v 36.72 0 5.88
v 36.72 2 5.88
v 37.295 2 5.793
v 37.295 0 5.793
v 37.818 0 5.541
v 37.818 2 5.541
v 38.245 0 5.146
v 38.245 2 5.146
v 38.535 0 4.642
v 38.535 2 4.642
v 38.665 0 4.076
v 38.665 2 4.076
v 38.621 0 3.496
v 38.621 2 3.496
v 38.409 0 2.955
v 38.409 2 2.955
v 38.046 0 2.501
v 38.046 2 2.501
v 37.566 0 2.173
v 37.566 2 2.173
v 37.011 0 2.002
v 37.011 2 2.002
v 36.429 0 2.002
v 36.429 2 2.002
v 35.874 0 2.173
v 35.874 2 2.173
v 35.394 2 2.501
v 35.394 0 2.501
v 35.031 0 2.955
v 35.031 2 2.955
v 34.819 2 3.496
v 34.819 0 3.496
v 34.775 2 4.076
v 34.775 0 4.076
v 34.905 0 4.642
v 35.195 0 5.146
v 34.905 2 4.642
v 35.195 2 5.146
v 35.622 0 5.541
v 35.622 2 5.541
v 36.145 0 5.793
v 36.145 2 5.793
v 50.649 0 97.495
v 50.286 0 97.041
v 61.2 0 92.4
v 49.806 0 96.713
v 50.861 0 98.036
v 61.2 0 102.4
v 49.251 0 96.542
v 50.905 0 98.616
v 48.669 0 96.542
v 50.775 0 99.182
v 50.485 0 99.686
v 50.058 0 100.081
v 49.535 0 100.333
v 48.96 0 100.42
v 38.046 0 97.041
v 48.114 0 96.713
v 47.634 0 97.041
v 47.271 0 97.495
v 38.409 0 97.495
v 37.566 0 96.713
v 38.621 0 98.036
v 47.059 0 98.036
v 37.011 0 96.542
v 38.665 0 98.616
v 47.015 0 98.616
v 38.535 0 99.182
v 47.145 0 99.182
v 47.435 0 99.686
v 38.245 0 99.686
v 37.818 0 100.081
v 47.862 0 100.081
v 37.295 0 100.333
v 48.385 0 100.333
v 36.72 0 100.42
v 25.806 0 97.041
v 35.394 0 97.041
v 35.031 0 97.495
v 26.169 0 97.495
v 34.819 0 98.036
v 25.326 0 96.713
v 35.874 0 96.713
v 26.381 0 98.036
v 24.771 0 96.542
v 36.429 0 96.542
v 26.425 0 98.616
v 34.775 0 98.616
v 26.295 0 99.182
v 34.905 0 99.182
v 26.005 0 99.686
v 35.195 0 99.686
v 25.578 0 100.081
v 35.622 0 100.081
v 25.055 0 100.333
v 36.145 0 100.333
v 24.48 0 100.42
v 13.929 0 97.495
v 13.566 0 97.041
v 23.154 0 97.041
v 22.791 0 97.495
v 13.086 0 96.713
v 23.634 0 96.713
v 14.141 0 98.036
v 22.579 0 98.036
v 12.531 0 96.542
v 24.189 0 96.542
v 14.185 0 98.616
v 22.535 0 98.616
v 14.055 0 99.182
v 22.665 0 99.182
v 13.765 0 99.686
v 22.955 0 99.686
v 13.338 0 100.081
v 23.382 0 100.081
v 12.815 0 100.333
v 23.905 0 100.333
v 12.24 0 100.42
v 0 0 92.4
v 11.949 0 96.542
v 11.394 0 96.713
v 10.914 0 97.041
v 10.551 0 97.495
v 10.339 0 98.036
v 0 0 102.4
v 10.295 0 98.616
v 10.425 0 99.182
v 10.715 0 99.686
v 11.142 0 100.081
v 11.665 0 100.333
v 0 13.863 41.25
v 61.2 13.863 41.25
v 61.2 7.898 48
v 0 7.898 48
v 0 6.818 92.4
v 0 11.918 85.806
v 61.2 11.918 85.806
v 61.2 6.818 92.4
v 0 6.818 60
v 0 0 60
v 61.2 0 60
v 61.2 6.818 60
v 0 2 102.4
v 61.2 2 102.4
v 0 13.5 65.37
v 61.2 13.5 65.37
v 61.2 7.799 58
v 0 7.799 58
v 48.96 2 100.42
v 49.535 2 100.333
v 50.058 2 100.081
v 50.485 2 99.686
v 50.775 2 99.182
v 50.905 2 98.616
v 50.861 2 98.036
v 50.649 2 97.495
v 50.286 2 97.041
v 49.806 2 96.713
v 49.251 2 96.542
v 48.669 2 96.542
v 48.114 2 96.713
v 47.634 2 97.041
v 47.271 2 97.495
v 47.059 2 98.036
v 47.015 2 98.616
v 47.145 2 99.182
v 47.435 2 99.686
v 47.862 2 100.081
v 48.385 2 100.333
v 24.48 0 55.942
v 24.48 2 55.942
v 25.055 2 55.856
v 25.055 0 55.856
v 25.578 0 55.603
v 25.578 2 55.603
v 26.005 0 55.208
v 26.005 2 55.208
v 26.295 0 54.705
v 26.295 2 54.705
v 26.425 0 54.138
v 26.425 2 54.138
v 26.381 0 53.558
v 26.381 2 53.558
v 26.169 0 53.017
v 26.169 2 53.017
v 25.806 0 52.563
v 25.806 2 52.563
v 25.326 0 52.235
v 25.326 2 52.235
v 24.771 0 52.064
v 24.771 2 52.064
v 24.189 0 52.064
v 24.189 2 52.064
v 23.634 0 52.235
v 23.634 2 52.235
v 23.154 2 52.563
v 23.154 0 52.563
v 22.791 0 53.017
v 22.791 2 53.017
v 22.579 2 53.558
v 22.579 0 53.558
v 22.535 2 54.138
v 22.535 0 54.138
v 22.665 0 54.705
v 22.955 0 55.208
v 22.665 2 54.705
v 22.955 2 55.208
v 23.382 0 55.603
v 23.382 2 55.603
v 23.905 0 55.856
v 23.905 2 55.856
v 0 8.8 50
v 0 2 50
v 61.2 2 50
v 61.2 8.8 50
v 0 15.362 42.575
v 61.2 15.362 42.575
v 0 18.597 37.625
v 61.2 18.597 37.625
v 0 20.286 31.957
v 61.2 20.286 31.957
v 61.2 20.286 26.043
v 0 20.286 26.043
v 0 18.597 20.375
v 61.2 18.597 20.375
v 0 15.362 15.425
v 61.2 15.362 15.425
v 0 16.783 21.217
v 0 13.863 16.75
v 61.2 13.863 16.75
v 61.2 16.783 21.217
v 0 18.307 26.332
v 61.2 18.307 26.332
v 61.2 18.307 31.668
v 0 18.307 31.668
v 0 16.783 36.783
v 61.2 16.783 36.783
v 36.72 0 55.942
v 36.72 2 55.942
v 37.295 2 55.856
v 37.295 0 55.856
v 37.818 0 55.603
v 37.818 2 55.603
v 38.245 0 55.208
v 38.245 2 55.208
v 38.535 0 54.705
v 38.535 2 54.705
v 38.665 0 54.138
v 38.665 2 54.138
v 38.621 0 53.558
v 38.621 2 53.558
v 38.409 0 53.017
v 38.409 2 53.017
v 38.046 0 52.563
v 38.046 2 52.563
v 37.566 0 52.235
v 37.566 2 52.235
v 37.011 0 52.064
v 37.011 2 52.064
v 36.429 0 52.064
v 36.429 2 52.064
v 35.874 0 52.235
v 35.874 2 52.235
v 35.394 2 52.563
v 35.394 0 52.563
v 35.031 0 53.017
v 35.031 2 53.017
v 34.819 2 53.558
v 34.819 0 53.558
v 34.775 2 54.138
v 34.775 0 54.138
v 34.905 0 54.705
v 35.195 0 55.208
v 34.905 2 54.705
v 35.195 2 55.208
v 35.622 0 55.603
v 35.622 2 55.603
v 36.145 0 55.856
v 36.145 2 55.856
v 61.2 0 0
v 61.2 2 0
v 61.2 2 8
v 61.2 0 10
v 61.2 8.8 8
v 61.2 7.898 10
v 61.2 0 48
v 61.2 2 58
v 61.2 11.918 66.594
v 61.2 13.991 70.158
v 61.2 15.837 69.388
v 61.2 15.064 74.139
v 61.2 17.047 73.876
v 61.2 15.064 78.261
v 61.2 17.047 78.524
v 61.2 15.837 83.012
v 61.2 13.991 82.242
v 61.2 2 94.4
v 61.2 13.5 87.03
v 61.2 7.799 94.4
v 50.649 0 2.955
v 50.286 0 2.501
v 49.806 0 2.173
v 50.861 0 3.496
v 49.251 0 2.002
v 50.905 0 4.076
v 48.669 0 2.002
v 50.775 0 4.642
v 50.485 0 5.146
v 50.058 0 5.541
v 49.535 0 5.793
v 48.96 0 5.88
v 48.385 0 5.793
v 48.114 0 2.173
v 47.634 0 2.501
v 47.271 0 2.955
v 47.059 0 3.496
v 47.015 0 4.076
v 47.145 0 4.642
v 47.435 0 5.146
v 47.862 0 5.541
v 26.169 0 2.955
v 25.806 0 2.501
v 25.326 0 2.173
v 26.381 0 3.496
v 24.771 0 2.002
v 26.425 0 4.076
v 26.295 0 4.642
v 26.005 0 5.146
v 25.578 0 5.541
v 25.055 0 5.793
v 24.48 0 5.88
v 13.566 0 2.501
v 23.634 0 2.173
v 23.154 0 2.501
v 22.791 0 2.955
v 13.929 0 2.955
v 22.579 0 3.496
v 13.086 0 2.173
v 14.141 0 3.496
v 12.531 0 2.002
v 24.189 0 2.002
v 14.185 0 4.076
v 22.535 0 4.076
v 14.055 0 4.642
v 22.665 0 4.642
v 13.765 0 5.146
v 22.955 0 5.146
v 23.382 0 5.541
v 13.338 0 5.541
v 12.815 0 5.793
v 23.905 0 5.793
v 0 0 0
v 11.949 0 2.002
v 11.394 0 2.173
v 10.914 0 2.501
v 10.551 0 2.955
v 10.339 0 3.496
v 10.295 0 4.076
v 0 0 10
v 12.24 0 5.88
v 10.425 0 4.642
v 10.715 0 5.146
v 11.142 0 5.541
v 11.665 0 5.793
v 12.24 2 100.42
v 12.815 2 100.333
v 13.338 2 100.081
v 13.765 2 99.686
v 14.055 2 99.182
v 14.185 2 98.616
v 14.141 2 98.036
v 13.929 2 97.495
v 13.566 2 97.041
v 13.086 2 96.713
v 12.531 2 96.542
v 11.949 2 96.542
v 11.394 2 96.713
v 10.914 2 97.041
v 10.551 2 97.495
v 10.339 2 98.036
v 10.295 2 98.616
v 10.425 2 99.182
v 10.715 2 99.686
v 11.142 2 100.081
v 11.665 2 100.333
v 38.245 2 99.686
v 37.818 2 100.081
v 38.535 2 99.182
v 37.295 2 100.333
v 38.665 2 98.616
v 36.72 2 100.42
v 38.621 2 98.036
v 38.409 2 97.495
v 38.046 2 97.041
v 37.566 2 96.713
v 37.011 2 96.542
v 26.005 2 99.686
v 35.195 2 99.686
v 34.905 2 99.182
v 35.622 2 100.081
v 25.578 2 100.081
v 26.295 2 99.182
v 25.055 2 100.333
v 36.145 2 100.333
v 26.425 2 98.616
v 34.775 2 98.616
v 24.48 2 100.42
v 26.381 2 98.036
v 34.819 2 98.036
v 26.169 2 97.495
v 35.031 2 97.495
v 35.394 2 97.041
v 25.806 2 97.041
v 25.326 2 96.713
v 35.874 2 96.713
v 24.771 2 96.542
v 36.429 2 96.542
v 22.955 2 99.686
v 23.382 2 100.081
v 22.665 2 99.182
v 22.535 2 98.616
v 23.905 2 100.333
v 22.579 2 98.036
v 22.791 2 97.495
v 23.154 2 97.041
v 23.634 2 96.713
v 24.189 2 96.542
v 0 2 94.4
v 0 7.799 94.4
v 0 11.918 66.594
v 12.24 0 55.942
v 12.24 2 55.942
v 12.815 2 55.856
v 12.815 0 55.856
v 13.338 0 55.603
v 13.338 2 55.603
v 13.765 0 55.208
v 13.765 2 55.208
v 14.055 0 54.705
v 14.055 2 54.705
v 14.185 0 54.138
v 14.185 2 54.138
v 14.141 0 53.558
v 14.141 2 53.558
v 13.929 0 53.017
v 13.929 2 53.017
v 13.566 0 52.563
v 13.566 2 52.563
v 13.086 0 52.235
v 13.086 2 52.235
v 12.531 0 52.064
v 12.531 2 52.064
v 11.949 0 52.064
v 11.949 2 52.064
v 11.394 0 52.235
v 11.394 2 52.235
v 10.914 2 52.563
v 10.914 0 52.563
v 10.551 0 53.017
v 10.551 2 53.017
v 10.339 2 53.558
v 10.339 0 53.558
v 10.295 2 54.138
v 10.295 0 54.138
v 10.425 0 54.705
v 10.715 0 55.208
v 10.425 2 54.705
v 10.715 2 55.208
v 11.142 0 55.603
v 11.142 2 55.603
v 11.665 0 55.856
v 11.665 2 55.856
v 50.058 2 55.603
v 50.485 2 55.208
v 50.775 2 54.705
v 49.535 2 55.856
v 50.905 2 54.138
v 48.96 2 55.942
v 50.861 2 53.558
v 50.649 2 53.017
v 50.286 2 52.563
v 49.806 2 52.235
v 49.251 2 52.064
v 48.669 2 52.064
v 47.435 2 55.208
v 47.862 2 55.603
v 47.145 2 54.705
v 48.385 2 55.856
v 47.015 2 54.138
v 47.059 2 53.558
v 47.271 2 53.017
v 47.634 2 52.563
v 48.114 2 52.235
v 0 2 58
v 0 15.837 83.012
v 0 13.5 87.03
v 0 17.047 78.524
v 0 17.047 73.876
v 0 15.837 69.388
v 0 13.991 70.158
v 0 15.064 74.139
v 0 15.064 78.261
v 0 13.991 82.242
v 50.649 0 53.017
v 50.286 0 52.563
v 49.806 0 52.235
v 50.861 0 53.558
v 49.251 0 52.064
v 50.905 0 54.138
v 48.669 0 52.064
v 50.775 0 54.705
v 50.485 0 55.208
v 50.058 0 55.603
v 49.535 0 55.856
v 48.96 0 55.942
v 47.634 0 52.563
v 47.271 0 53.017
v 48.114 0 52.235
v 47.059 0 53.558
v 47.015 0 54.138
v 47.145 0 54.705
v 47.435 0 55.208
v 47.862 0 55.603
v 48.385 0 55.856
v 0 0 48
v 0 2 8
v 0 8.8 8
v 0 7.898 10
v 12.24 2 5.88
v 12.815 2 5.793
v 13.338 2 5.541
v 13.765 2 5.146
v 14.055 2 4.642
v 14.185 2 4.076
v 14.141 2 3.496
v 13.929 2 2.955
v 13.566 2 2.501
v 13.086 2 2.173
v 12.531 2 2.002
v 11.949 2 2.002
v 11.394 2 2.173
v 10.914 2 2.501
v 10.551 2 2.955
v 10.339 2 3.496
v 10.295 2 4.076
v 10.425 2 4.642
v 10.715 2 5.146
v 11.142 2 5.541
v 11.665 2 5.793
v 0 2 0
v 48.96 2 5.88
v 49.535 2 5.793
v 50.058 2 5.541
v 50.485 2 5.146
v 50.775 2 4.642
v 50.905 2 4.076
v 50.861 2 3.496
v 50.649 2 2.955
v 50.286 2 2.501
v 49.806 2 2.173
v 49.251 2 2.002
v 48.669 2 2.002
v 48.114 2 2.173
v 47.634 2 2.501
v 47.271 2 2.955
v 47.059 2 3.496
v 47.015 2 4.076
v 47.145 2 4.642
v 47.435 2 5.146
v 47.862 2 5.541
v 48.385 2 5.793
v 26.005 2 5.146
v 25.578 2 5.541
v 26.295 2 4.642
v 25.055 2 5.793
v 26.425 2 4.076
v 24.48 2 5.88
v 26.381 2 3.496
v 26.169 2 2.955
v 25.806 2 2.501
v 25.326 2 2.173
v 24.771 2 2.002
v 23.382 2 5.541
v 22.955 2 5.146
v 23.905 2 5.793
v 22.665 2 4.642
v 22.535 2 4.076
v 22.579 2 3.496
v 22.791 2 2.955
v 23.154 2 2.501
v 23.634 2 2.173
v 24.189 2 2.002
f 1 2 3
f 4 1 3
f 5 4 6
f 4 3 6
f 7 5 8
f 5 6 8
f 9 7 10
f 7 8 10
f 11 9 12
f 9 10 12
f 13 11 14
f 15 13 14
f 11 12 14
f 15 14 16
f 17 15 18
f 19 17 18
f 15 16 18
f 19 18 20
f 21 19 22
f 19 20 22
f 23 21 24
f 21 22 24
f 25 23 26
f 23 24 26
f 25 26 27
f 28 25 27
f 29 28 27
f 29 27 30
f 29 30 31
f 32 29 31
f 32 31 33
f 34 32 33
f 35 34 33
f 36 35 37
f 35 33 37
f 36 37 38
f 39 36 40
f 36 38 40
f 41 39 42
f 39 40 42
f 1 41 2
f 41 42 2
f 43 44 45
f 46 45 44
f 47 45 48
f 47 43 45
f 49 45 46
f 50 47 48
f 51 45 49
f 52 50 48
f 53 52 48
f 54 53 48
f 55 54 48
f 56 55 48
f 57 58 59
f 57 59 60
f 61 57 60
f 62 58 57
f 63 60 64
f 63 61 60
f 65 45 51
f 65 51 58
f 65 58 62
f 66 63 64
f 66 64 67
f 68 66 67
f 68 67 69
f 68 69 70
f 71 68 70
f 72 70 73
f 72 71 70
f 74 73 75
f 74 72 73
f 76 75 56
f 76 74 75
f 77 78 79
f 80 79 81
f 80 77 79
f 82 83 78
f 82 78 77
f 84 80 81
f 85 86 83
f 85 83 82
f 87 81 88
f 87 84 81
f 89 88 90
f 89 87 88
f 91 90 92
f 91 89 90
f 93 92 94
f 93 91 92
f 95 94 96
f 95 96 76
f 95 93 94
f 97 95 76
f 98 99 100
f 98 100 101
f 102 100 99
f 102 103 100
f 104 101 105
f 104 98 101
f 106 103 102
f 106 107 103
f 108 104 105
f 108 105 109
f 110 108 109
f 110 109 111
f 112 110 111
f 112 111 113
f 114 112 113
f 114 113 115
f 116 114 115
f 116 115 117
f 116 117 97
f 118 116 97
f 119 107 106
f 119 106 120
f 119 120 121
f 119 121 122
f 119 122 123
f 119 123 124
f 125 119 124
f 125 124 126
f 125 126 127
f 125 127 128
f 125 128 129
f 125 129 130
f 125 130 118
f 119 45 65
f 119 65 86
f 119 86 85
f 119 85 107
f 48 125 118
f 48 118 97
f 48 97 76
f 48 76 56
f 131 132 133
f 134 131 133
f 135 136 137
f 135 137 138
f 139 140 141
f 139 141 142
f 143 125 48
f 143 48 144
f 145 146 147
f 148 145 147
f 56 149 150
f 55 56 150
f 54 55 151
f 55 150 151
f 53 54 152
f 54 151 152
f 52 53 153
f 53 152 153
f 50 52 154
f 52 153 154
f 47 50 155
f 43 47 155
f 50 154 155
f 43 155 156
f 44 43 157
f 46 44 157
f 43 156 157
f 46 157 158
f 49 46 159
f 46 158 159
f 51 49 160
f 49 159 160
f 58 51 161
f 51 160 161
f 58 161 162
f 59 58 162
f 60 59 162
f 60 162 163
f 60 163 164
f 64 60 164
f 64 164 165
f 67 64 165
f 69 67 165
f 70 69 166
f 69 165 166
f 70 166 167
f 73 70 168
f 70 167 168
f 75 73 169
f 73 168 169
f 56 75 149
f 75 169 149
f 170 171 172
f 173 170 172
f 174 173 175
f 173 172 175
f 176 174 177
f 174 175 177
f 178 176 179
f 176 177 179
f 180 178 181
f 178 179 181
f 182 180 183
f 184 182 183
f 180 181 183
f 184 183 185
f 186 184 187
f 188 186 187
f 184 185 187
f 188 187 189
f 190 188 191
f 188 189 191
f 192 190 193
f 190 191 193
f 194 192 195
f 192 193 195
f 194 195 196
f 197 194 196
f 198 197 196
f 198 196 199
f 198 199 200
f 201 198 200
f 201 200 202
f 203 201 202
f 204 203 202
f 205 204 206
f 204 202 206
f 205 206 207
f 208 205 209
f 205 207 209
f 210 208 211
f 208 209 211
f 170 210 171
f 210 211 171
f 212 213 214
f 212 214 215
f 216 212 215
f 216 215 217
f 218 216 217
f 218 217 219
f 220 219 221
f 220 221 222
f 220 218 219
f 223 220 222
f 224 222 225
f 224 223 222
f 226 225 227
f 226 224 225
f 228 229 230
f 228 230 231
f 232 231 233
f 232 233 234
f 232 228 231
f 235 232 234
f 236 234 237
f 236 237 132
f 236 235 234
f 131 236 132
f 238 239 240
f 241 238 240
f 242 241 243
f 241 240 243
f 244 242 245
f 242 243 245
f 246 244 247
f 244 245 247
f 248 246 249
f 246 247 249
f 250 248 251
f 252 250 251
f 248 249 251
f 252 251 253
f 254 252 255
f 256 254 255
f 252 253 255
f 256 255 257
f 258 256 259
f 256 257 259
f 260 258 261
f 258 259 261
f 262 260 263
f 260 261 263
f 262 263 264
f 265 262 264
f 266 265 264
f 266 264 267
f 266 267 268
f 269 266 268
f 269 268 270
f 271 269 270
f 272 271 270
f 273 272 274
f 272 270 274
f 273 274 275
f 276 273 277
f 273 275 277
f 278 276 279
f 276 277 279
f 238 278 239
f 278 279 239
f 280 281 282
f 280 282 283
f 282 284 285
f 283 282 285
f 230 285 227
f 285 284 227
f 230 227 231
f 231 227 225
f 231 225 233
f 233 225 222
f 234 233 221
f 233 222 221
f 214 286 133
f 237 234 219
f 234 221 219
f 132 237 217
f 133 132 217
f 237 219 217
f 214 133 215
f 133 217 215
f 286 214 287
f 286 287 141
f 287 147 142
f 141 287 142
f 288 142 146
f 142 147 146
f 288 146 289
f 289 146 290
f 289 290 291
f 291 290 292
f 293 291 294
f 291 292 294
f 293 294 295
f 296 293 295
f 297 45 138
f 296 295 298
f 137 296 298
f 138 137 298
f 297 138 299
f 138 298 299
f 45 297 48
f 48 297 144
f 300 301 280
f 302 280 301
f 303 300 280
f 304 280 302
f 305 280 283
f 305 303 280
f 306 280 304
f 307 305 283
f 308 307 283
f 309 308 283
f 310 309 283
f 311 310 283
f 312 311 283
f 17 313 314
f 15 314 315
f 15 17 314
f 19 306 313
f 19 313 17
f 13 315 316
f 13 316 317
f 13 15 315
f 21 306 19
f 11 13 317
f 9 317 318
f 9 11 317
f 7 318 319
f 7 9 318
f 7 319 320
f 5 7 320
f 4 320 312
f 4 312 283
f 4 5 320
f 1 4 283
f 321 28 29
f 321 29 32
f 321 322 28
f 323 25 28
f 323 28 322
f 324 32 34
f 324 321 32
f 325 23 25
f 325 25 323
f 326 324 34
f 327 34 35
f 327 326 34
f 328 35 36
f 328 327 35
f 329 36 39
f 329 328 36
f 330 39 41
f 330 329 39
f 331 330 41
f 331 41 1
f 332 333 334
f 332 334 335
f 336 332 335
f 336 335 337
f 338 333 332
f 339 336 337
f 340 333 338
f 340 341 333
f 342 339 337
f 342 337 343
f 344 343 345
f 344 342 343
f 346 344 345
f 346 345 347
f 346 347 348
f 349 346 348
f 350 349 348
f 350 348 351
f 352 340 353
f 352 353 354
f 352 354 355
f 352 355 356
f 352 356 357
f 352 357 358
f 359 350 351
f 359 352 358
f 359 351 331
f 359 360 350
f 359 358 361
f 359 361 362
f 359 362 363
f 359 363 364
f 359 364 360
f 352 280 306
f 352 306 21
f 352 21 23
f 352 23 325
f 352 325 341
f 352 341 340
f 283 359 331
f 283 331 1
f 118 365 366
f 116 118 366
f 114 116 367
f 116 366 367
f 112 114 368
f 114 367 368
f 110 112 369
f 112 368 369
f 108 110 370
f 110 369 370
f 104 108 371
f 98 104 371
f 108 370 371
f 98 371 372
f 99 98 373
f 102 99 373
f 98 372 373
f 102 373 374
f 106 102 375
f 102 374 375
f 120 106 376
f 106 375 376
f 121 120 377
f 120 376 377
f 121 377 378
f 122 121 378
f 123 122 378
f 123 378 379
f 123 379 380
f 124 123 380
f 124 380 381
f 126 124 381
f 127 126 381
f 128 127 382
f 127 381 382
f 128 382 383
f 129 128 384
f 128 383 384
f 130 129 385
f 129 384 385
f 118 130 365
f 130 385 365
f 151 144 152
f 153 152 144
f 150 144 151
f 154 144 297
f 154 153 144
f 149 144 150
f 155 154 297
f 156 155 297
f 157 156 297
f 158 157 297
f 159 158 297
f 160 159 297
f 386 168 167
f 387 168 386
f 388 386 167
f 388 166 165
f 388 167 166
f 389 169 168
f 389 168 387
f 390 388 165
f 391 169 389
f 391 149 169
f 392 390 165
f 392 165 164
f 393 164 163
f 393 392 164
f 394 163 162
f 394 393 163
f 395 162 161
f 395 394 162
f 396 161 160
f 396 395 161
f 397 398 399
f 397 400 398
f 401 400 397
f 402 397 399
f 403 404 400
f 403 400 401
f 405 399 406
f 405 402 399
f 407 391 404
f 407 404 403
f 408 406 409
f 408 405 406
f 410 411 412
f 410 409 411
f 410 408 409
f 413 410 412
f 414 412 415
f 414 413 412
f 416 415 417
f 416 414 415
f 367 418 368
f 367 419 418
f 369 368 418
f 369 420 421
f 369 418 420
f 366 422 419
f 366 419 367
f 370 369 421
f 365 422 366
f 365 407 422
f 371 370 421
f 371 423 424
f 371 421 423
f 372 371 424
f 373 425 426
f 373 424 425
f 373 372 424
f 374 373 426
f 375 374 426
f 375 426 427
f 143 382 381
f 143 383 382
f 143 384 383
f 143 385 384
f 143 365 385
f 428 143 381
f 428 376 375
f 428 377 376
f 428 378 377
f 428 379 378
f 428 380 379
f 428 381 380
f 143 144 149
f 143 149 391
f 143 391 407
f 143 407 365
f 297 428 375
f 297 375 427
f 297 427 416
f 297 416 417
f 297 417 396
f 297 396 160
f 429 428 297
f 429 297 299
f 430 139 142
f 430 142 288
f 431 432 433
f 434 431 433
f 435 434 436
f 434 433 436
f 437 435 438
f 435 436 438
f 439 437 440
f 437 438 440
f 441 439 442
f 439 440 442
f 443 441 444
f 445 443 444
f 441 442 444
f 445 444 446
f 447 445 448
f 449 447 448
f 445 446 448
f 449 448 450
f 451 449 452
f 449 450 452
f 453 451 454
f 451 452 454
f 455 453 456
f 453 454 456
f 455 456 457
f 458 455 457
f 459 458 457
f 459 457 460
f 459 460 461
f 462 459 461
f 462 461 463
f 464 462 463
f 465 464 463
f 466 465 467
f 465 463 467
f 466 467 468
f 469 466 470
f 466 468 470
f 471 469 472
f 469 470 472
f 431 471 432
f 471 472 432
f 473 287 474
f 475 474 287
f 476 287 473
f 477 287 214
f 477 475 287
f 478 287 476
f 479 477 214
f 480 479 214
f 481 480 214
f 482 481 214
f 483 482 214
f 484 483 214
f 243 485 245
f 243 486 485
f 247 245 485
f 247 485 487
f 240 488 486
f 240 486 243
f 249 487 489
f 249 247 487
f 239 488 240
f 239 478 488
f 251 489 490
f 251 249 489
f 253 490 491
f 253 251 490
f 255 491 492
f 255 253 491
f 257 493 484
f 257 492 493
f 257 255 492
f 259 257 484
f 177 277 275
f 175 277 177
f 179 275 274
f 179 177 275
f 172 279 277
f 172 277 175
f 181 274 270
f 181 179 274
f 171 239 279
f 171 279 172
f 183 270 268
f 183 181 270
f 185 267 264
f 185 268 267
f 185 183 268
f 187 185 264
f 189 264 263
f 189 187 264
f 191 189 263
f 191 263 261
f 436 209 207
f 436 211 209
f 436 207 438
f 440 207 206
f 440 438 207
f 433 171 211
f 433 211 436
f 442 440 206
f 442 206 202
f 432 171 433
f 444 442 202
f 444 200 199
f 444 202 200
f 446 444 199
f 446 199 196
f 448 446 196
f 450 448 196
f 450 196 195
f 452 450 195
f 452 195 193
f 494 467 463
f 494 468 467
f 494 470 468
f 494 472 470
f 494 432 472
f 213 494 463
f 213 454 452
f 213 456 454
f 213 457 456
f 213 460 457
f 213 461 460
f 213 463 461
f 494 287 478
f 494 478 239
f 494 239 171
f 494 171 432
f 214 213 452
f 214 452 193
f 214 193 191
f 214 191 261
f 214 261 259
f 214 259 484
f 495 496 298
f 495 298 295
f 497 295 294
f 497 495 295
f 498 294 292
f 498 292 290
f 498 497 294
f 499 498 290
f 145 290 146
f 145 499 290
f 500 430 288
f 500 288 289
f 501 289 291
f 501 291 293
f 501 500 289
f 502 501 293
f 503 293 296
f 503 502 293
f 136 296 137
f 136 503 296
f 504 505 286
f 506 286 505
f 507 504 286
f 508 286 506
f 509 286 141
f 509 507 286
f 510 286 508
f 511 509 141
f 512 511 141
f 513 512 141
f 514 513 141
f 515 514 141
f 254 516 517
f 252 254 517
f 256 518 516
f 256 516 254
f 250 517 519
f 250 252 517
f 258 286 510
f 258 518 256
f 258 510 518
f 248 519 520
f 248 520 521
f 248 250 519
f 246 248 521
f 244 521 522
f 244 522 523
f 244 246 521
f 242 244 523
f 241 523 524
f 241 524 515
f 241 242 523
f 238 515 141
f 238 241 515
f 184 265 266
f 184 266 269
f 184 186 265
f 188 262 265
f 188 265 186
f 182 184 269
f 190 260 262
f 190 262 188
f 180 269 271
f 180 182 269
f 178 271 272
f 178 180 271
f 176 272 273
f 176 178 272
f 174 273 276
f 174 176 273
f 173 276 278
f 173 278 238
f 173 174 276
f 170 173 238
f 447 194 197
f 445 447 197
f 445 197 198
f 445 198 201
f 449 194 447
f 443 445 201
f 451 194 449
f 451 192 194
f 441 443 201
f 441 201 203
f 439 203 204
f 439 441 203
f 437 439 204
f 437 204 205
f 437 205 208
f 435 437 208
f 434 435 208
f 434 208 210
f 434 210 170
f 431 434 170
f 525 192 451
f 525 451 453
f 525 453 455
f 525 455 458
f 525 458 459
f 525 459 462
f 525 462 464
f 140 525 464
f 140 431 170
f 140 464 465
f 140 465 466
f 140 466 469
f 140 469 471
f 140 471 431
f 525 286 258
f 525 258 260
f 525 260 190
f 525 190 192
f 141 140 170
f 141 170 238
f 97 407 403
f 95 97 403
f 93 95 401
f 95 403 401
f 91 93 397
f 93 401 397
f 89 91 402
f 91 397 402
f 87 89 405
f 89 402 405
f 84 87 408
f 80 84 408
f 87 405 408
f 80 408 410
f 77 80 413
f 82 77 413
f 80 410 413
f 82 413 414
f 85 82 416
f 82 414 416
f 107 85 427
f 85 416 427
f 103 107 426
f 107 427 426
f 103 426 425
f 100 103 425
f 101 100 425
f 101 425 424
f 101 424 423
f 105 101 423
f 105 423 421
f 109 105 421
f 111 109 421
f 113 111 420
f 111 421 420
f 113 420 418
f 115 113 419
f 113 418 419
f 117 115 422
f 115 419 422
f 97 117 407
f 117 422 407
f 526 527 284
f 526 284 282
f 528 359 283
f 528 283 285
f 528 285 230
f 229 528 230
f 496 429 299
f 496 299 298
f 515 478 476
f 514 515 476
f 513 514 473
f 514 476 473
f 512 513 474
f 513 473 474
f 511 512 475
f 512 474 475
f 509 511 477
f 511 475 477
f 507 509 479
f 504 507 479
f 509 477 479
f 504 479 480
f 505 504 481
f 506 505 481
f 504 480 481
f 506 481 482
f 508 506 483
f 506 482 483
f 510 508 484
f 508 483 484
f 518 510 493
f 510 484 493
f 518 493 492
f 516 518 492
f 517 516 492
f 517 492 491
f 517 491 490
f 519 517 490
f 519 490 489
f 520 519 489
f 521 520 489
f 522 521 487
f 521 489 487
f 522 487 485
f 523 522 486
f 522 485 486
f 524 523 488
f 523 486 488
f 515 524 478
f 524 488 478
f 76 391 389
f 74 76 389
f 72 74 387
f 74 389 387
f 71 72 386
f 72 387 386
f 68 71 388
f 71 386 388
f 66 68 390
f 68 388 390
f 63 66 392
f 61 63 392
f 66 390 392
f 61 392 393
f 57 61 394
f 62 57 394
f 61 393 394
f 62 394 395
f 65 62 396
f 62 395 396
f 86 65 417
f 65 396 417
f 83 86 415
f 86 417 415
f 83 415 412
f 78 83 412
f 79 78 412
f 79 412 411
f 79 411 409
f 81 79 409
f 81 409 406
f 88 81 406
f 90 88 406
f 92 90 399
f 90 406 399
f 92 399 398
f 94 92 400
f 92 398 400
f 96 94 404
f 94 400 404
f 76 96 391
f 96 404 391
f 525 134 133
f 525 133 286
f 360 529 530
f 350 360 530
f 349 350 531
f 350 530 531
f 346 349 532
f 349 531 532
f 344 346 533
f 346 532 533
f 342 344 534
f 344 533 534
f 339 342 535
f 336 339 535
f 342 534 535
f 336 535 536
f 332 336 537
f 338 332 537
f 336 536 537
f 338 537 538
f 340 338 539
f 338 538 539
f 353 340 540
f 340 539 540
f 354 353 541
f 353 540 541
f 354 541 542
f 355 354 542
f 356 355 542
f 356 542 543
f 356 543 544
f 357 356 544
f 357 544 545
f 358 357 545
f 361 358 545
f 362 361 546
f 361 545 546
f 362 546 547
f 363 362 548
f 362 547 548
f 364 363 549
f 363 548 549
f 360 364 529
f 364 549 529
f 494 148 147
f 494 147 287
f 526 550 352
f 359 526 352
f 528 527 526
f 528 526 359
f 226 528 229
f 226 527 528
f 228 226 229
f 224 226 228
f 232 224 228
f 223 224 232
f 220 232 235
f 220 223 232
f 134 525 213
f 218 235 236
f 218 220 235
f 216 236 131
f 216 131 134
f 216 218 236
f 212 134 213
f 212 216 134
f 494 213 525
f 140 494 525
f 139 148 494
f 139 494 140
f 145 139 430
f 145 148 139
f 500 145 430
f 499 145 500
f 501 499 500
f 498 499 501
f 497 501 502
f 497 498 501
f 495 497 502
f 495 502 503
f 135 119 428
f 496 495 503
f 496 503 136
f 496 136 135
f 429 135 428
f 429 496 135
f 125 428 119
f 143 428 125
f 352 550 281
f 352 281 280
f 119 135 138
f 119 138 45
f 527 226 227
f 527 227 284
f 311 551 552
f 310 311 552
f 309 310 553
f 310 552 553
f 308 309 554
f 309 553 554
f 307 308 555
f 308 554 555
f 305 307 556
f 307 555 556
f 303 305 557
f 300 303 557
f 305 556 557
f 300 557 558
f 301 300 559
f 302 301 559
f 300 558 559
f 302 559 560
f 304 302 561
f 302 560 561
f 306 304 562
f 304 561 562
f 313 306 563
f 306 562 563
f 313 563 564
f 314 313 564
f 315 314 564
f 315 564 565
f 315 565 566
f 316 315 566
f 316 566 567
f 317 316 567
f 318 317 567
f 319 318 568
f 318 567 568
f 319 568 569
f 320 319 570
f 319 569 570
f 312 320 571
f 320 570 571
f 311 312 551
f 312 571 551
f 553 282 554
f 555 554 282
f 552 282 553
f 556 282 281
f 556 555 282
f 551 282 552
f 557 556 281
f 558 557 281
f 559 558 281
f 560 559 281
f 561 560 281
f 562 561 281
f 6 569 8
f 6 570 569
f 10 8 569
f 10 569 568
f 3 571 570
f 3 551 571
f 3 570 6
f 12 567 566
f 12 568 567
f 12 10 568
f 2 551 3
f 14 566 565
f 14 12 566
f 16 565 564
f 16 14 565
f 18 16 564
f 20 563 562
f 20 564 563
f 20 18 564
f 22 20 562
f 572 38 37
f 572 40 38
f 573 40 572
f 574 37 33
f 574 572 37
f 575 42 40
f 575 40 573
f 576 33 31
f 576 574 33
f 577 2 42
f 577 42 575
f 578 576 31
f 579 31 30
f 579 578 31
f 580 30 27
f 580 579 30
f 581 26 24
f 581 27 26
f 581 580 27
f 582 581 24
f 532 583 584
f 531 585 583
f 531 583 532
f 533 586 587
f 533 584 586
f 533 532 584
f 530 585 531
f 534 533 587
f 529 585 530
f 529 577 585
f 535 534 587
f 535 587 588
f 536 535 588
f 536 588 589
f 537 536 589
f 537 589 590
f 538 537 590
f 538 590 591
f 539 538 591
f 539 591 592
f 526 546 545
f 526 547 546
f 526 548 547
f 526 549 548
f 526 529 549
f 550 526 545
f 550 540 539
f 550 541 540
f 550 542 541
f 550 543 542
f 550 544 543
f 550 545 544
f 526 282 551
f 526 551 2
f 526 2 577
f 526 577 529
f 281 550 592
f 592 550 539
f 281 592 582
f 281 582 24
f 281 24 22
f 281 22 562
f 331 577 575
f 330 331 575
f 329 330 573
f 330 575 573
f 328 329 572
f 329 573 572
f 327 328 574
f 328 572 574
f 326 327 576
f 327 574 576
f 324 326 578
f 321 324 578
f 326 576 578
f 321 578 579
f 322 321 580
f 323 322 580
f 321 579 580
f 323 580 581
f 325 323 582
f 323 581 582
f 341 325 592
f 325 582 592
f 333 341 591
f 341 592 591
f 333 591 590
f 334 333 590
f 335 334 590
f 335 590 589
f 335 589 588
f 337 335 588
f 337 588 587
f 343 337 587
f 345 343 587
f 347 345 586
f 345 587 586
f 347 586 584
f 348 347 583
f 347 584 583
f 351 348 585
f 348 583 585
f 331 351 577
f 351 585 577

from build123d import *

# Parameters (mm, degrees)
BOSS_EXTRUDE1_DEPTH = 61.2
SKETCH3_R           = 1.95
CUT_EXTRUDE1_DEPTH  = 2


with BuildPart() as part:
    # Sketch2 → Boss-Extrude1 (new body)
    with BuildSketch(Plane(origin=(0, 0, 0), x_dir=(0, 0, -1), z_dir=(1, 0, 0))):
        with BuildLine():
            Line((0, 0), (-10, 0))
            Line((-10, 0), (-10, 7.898424126))
            Line((-10, 7.898424126), (-16.749767181, 13.862964902))
            ThreePointArc((-16.749767181, 13.862964902), (-29, 18.5), (-41.250232819, 13.862964902))
            Line((-41.250232819, 13.862964902), (-48, 7.898424126))
            Line((-48, 7.898424126), (-48, 0))
            Line((-48, 0), (-60, 0))
            Line((-60, 0), (-60, 6.817623549))
            Line((-60, 6.817623549), (-66.59398274, 11.918310368))
            ThreePointArc((-66.59398274, 11.918310368), (-76.2, 15.2), (-85.80601726, 11.918310368))
            Line((-85.80601726, 11.918310368), (-92.4, 6.817623549))
            Line((-92.4, 6.817623549), (-92.4, 0))
            Line((-92.4, 0), (-102.4, 0))
            Line((-102.4, 0), (-102.4, 2))
            Line((-102.4, 2), (-94.4, 2))
            Line((-94.4, 2), (-94.4, 7.799074738))
            Line((-94.4, 7.799074738), (-87.029713726, 13.500260734))
            ThreePointArc((-87.029713726, 13.500260734), (-76.2, 17.2), (-65.370286274, 13.500260734))
            Line((-65.370286274, 13.500260734), (-58, 7.799074738))
            Line((-58, 7.799074738), (-58, 2))
            Line((-58, 2), (-50, 2))
            Line((-50, 2), (-50, 8.800073553))
            Line((-50, 8.800073553), (-42.574582313, 15.361663811))
            ThreePointArc((-42.574582313, 15.361663811), (-29, 20.5), (-15.425417687, 15.361663811))
            Line((-15.425417687, 15.361663811), (-8, 8.800073553))
            Line((-8, 8.800073553), (-8, 2))
            Line((-8, 2), (0, 2))
            Line((0, 2), (0, 0))
        make_face()
    extrude(amount=BOSS_EXTRUDE1_DEPTH)

    # Sketch3 → Cut-Extrude1 (cut)
    with BuildSketch(Plane(origin=(0, 2, 0), x_dir=(1, 0, 0), z_dir=(0, 1, 0))):
        with Locations(Location((12.24, -3.93, 0), (0, 0, 270))):
            Circle(SKETCH3_R)
        with Locations(Location((24.48, -3.93, 0), (0, 0, 270))):
            Circle(SKETCH3_R)
        with Locations(Location((36.72, -3.93, 0), (0, 0, 270))):
            Circle(SKETCH3_R)
        with Locations(Location((48.96, -3.93, 0), (0, 0, 270))):
            Circle(SKETCH3_R)
        with Locations(Location((12.24, -53.992271577, 0), (0, 0, 270))):
            Circle(SKETCH3_R)
        with Locations(Location((24.48, -53.992271577, 0), (0, 0, 270))):
            Circle(SKETCH3_R)
        with Locations(Location((36.72, -53.992271577, 0), (0, 0, 270))):
            Circle(SKETCH3_R)
        with Locations(Location((48.96, -53.992271577, 0), (0, 0, 270))):
            Circle(SKETCH3_R)
        with Locations(Location((12.24, -98.47, 0), (0, 0, 270))):
            Circle(SKETCH3_R)
        with Locations(Location((24.48, -98.47, 0), (0, 0, 270))):
            Circle(SKETCH3_R)
        with Locations(Location((36.72, -98.47, 0), (0, 0, 270))):
            Circle(SKETCH3_R)
        with Locations(Location((48.96, -98.47, 0), (0, 0, 270))):
            Circle(SKETCH3_R)
    extrude(amount=-CUT_EXTRUDE1_DEPTH, mode=Mode.SUBTRACT)


solid = part.part
